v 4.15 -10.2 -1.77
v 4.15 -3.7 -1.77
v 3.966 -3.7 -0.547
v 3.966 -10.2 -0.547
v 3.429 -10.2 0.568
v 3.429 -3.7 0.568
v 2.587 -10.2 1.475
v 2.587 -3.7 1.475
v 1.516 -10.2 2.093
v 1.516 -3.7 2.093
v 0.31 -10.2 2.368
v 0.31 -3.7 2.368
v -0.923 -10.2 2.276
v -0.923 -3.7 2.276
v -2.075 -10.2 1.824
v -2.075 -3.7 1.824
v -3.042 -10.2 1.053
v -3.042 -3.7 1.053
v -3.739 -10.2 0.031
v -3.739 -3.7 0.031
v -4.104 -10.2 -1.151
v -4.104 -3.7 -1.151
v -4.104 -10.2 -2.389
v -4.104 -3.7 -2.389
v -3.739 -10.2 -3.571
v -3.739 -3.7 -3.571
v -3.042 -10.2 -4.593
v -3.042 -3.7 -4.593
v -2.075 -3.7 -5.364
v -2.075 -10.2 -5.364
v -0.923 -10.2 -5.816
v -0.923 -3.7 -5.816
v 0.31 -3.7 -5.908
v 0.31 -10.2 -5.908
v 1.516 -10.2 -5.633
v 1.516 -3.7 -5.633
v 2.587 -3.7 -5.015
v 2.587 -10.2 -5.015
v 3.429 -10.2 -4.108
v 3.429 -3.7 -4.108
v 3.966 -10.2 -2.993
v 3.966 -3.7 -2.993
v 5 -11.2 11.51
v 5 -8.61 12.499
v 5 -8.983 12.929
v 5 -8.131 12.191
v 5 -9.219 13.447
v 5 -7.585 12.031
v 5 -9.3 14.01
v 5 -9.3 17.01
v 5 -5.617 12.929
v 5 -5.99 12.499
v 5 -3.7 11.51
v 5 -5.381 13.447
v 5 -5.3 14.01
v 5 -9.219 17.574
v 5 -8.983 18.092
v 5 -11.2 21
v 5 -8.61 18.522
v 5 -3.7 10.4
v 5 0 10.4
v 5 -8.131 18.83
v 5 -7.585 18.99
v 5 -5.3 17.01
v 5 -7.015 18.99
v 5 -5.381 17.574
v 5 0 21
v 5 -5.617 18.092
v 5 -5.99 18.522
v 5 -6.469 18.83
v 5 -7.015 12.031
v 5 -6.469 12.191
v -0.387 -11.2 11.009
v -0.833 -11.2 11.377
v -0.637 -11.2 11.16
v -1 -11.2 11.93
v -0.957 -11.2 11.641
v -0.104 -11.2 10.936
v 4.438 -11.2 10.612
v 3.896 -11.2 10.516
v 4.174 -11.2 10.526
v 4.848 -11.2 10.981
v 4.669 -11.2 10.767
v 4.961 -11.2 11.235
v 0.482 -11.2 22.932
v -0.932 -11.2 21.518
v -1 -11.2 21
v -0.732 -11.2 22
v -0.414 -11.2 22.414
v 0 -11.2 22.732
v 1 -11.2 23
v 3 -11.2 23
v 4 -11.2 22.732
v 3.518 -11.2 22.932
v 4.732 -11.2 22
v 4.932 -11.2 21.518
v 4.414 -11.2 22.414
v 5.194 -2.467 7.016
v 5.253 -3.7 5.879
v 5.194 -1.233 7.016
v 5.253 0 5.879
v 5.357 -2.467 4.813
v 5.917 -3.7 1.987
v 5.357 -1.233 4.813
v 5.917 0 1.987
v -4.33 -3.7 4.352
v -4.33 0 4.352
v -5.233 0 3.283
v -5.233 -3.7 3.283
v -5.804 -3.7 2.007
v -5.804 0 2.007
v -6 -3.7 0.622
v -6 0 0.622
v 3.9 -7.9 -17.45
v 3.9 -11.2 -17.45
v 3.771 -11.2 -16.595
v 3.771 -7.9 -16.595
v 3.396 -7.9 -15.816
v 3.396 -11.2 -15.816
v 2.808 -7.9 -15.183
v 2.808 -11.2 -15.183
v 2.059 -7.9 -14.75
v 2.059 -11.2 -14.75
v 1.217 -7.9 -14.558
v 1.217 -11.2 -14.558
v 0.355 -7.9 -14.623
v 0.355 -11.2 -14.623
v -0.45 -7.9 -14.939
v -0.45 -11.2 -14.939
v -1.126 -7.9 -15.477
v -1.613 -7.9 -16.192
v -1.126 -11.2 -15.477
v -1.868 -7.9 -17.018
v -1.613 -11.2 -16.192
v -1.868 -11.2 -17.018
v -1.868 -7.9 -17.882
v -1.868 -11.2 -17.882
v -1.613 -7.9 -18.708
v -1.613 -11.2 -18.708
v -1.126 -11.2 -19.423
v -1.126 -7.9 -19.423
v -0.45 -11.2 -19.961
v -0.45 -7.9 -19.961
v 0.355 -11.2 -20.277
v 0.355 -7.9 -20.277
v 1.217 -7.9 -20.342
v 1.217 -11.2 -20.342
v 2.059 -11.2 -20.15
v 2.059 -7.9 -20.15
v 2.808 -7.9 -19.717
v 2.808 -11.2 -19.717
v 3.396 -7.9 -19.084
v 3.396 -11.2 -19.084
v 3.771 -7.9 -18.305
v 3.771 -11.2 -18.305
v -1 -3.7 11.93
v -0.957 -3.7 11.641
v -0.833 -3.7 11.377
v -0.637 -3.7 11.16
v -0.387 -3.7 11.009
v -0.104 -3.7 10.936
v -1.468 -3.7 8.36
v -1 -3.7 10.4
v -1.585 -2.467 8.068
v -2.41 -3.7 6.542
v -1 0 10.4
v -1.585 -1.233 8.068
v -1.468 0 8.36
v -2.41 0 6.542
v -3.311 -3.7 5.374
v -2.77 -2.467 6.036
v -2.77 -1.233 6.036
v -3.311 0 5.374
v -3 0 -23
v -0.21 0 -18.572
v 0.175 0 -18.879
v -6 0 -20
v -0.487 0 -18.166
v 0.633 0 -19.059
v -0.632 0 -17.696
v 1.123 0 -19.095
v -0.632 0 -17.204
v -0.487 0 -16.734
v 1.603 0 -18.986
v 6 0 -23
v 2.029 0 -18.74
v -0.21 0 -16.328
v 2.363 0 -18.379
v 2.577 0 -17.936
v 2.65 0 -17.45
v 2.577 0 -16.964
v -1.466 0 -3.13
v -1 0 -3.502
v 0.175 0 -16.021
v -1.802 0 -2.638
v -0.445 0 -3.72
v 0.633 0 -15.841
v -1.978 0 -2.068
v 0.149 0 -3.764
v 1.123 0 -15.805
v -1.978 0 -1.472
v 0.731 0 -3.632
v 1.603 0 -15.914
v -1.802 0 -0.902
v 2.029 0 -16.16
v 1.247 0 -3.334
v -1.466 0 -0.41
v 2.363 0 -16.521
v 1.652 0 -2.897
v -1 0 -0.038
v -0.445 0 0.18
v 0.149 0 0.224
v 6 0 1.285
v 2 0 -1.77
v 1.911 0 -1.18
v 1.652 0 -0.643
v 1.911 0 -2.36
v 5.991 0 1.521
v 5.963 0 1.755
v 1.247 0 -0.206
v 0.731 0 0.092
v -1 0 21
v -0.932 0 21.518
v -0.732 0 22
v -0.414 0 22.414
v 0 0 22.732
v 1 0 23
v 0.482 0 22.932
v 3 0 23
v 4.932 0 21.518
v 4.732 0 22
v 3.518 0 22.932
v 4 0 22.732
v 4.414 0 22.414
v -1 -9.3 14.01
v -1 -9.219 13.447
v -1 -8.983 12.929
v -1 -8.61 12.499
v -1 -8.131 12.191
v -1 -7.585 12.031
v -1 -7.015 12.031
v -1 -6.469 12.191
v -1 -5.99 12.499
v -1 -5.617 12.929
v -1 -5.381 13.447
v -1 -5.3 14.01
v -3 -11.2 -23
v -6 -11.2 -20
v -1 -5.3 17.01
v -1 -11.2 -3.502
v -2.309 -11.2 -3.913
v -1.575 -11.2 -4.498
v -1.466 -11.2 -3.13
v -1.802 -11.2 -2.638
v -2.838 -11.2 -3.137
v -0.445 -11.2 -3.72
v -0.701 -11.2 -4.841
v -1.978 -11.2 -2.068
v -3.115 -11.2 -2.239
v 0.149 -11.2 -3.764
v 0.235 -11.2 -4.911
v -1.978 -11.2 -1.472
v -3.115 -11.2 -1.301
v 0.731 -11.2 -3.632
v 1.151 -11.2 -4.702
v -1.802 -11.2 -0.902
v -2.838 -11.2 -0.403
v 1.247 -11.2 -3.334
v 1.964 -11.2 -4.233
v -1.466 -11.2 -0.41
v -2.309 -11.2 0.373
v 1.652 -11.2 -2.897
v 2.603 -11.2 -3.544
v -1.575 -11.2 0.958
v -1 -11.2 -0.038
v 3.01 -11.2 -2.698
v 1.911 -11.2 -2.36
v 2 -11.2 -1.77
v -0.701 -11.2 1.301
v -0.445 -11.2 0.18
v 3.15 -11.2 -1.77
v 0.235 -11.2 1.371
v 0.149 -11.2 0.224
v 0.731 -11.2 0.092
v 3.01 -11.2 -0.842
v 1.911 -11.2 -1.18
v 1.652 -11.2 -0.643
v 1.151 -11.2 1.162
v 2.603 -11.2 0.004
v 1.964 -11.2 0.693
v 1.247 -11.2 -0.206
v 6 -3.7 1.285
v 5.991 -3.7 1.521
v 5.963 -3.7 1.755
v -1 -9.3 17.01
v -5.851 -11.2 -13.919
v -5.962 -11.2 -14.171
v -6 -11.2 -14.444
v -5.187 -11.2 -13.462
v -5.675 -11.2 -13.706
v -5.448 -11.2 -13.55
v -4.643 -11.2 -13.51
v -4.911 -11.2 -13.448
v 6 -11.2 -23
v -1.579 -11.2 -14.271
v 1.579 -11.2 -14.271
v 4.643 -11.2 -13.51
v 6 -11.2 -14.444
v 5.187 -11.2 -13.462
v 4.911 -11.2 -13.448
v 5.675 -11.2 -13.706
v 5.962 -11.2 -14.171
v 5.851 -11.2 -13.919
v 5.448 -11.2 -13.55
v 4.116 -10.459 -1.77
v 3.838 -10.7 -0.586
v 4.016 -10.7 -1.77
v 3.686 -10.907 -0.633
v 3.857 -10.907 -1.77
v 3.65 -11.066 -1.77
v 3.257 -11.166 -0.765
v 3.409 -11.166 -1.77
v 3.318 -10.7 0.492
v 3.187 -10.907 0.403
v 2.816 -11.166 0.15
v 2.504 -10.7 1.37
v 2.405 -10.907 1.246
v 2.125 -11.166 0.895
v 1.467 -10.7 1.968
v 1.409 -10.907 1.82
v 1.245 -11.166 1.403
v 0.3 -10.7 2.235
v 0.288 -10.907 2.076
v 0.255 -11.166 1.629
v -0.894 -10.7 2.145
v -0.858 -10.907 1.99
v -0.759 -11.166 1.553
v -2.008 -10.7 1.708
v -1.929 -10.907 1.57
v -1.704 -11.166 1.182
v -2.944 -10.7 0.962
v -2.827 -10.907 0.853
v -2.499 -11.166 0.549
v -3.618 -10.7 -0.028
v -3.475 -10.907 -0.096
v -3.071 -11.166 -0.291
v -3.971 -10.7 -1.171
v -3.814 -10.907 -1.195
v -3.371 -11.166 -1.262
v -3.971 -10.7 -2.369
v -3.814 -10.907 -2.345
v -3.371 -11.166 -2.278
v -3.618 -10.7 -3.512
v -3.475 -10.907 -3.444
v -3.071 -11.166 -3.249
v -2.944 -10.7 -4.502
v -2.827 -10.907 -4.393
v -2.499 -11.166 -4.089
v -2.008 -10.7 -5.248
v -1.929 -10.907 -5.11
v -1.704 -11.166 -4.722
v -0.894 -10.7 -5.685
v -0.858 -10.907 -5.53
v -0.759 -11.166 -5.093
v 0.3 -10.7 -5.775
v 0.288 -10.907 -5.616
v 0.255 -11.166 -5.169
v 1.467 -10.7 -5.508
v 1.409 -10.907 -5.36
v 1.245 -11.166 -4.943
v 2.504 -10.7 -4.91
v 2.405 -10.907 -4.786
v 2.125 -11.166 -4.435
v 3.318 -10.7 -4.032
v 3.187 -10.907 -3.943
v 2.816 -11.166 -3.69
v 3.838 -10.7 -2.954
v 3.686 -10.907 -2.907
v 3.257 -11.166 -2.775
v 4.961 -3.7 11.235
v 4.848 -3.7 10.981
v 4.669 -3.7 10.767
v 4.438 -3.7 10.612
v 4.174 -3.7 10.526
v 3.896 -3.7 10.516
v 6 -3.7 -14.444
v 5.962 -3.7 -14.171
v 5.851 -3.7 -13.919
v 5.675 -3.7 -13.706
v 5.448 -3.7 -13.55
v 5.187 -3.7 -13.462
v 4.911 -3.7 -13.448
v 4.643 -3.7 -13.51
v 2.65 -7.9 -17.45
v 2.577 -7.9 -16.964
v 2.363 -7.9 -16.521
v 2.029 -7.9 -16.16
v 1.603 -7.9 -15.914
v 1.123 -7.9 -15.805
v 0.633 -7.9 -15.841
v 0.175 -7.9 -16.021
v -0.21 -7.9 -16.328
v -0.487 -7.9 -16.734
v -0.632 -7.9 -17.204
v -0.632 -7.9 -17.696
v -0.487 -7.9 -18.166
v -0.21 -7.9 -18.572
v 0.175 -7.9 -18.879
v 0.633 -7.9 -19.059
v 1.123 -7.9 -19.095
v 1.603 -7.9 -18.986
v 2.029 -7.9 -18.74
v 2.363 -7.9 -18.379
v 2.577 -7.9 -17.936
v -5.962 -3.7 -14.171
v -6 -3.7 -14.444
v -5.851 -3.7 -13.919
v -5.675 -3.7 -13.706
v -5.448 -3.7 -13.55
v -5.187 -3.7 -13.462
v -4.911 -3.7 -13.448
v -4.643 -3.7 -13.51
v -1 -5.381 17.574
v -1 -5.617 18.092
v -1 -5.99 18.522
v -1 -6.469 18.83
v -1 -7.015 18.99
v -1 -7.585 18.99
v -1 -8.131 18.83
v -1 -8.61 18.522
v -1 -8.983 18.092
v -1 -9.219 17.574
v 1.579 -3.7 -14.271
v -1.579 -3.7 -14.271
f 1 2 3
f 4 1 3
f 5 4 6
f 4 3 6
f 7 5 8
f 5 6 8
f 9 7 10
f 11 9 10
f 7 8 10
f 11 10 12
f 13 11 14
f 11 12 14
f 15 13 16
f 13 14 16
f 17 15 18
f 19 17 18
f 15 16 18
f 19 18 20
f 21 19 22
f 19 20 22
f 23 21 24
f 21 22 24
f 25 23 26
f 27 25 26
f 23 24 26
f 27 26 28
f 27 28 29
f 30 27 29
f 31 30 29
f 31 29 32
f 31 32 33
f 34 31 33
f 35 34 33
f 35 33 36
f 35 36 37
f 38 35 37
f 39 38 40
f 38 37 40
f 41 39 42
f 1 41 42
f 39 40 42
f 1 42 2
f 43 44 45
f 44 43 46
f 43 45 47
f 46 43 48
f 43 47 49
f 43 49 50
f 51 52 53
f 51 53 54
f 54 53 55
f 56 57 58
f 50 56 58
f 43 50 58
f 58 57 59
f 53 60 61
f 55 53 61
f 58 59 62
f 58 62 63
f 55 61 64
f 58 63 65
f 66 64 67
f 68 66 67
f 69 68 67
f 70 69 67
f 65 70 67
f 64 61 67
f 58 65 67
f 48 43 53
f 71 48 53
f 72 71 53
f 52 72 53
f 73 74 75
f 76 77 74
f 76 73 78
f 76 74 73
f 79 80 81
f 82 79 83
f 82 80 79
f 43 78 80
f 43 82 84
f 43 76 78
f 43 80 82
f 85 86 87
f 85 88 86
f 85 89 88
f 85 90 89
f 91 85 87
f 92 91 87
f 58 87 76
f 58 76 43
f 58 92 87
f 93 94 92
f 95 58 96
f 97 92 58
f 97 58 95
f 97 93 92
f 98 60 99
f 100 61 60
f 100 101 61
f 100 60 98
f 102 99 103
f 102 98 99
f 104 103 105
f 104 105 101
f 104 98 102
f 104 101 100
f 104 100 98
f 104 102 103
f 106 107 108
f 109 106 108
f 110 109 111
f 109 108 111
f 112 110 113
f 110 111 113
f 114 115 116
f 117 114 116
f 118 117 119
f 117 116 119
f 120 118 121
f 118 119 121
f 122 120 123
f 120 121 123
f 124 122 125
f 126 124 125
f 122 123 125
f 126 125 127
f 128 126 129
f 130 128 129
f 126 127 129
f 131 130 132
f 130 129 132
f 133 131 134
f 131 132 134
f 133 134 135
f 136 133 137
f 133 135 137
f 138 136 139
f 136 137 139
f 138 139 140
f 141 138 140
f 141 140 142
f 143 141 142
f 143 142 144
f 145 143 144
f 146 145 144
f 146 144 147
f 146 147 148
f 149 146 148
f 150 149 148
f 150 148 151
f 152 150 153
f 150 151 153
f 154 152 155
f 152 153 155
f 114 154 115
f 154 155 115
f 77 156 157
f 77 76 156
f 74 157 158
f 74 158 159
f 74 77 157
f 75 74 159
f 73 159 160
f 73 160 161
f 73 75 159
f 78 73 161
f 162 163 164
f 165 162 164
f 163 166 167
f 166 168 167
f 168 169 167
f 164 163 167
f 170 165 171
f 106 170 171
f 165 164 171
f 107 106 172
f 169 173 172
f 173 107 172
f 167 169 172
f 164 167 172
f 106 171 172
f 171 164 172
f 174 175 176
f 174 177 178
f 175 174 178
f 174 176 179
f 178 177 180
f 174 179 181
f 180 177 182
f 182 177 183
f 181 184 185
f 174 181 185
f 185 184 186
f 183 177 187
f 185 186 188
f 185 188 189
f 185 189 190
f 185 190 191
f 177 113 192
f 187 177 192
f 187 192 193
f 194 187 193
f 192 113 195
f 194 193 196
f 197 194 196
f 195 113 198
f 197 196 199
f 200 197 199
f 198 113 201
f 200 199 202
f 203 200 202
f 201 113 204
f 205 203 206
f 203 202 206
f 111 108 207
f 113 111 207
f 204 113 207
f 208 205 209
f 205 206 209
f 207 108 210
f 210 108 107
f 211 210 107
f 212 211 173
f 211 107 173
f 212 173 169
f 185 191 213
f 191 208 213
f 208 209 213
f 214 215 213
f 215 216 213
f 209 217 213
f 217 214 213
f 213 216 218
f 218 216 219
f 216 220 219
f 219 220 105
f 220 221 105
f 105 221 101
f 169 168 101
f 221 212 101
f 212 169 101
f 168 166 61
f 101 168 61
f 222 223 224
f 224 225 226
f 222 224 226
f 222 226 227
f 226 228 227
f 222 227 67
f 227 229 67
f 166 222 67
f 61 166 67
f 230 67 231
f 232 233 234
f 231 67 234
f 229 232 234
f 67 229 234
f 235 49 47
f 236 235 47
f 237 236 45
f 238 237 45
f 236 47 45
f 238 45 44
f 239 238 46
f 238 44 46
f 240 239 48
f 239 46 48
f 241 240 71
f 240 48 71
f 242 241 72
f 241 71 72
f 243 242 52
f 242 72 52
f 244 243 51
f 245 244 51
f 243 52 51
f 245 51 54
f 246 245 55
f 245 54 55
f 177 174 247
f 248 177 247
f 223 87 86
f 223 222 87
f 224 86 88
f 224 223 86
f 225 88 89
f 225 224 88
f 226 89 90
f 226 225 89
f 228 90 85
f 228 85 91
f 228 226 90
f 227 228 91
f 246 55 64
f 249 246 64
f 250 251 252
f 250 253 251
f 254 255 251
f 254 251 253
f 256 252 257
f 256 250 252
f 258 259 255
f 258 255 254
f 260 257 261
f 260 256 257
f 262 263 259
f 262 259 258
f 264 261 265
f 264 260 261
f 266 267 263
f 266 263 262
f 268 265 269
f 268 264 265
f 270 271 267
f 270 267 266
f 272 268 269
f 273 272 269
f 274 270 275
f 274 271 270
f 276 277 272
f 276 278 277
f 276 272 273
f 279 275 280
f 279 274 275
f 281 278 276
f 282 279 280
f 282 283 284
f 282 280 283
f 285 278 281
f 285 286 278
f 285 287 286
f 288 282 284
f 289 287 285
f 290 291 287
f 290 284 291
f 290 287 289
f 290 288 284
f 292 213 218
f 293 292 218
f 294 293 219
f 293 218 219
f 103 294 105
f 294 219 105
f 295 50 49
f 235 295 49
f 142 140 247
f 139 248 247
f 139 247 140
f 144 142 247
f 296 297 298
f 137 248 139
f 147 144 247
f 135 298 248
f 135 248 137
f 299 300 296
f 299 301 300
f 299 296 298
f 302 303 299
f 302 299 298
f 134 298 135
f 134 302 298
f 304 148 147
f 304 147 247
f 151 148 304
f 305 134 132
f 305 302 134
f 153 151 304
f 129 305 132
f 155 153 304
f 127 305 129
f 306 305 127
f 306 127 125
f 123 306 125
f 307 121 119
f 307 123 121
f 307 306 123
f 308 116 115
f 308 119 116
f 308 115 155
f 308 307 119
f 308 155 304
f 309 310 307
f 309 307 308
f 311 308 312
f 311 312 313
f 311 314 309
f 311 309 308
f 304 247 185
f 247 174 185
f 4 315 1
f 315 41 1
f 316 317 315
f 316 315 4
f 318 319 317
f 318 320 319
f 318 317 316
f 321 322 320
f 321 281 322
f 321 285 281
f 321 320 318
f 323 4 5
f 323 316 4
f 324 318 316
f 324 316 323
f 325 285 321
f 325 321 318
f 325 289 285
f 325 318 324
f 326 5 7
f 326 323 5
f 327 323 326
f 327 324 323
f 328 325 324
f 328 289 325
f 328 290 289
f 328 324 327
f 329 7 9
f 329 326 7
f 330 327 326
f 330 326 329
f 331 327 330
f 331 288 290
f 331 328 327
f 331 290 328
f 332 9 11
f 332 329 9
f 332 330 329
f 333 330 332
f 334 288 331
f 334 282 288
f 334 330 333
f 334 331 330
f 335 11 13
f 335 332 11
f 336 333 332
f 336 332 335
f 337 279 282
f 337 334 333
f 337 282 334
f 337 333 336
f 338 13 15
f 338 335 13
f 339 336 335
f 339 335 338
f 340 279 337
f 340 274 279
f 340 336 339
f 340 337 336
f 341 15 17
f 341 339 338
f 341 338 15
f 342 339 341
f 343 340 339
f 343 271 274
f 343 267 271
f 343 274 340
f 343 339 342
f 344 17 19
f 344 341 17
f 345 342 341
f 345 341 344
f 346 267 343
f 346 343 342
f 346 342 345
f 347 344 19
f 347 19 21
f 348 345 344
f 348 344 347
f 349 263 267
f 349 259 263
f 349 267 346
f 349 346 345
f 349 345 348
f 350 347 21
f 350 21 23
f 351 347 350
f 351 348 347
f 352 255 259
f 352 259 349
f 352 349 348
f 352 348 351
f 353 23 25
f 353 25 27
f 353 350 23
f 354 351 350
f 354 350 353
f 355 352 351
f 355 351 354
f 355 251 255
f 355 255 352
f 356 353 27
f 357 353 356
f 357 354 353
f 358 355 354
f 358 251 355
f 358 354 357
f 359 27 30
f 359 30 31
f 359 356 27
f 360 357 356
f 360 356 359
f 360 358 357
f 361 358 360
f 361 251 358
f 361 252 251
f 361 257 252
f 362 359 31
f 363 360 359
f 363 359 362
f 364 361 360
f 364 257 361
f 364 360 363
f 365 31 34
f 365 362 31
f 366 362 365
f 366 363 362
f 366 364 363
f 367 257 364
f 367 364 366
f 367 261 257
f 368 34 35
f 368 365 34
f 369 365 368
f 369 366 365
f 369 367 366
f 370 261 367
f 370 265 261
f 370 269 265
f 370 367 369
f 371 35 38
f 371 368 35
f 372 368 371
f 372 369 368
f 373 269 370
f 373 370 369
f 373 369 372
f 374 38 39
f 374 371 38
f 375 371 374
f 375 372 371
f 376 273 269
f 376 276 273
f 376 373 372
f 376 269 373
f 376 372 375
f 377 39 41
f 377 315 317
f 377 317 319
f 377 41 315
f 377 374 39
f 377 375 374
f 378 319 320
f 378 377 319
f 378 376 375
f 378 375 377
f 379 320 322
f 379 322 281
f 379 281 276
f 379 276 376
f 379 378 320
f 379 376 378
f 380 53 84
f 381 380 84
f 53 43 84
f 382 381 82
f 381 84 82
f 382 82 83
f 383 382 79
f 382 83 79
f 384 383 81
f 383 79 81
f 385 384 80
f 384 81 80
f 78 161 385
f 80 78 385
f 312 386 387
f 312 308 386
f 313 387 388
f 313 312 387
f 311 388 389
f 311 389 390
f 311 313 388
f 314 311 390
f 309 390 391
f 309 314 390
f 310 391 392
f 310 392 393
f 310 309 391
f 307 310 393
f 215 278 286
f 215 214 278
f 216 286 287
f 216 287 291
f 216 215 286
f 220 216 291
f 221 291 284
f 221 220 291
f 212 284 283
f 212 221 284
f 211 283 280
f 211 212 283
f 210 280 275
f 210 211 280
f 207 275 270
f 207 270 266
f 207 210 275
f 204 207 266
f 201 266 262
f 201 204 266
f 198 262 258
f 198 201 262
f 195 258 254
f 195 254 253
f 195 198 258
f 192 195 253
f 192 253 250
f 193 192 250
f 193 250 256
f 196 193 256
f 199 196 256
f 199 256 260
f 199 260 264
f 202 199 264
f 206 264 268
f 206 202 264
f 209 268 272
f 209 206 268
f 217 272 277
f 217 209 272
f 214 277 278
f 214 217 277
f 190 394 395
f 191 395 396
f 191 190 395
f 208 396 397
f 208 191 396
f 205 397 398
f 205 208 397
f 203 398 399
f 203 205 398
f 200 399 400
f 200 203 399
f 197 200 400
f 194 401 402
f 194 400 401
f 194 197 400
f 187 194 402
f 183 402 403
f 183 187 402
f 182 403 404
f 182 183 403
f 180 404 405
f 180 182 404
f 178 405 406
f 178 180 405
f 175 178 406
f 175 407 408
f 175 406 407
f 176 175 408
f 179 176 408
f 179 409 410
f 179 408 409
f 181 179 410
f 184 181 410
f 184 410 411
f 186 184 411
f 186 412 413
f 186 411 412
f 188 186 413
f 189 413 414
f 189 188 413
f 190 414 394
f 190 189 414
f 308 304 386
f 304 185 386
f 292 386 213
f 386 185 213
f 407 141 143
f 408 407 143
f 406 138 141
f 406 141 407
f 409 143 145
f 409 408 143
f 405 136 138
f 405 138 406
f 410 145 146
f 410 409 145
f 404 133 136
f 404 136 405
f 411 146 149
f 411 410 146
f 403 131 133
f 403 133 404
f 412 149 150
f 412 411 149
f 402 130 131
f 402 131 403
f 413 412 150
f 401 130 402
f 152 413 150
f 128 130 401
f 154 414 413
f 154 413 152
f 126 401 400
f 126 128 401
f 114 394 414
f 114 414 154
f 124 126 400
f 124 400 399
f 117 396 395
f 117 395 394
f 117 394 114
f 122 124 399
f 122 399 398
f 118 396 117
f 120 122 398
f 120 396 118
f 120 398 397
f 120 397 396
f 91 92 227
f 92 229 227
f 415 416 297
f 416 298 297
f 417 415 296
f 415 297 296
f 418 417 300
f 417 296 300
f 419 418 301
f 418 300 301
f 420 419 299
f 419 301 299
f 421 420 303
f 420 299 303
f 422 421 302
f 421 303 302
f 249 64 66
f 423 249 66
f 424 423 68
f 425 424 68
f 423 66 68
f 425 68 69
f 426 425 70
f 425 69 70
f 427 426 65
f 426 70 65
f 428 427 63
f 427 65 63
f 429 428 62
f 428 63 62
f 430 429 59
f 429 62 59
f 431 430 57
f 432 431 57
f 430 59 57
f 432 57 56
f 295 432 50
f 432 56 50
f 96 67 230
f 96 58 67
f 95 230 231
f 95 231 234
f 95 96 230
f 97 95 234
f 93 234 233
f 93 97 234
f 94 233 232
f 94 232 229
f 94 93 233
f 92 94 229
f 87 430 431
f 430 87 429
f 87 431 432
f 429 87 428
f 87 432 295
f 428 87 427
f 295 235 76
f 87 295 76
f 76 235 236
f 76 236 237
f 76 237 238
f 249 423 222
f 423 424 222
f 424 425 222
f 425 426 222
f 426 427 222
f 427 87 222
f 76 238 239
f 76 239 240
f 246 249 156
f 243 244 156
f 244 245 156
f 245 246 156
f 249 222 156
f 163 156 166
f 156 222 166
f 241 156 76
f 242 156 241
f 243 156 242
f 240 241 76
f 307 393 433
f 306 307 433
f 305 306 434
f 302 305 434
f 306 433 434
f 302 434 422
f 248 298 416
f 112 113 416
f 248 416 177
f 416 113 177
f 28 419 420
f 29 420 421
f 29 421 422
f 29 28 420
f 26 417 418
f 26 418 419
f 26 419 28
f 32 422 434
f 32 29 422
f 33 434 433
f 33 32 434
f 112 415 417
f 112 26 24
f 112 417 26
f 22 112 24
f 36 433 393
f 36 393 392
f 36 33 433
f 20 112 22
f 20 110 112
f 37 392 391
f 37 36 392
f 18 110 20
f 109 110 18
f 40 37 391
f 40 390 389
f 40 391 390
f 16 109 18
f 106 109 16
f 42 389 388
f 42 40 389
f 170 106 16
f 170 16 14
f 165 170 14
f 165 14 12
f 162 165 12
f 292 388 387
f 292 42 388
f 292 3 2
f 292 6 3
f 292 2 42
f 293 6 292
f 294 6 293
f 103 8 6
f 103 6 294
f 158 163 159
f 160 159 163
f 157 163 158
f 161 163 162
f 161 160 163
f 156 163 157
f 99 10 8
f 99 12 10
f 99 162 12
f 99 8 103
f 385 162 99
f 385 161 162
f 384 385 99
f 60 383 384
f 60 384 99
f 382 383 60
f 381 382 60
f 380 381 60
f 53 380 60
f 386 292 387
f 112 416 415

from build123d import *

# Parameters (mm, degrees)
F0_R      = 1.65
F0_R_2    = 2
F1_DEPTH  = 3.7
F2_R      = 4.15
F2_R_2    = 2
F2_R_3    = 1.65
F3_DEPTH  = 7.5
F4_R      = 2
F5_R      = 1
F6_R      = 2.9
F7_DEPTH  = 3.3
F8_R      = 1
F10_DEPTH = 11.0010001
F11_SIZE  = 3


with BuildPart() as f1:
    # F0 (on Front) → F1 (new body)
    with BuildSketch(Plane.XZ):
        with BuildLine():
            Line((5, 23), (-1, 23))
            Line((-1, 23), (-1, 10.4))
            add(Edge.make_bspline(
                [(-1, 10.4), (-1.2111639775, 7.9330686148), (-2.6557673414, 5.8471197981), (-4.3304576575, 4.3515548571)],
                knots=[0, 0, 0, 0, 6.6865737794, 6.6865737794, 6.6865737794, 6.6865737794], degree=3))
            ThreePointArc((-4.3304576575, 4.3515548571), (-5.5635670417, 2.6652064856), (-6, 0.6222048076))
            Line((-6, 0.6222048076), (-6, -23))
            Line((-6, -23), (6, -23))
            Line((6, -23), (6, 1.2846305262))
            ThreePointArc((6, 1.2846305262), (5.9790845004, 1.6382624525), (5.9166296405, 1.9869634531))
            add(Edge.make_bspline(
                [(5, 10.4), (5.3525537919, 5.8237470378), (5.0164384354, 5.7252537292), (5.9166296405, 1.9869634531)],
                knots=[0, 0, 0, 0, 8.5585174857, 8.5585174857, 8.5585174857, 8.5585174857], degree=3))
            Line((5, 10.4), (5, 23))
        make_face()
        with Locations((1, -17.45)):
            Circle(F0_R, mode=Mode.SUBTRACT)
        with Locations((0, -1.77)):
            Circle(F0_R_2, mode=Mode.SUBTRACT)
    extrude(amount=F1_DEPTH)

    # F2 (on face) → F3 (join)
    with BuildSketch(Plane.XZ.offset(3.7)):
        with Locations((0, -1.77)):
            Circle(F2_R)
        with Locations((0, -1.77)):
            Circle(F2_R_2, mode=Mode.SUBTRACT)
        with BuildLine():
            Line((-6, -12.9), (-6, -23))
            Line((-6, -23), (6, -23))
            Line((6, -23), (6, -12.9))
            ThreePointArc((6, -12.9), (0, -14.3674374053), (-6, -12.9))
        make_face()
        with Locations((1, -17.45)):
            Circle(F2_R_3, mode=Mode.SUBTRACT)
        Polygon((5, 23), (-1, 23), (-1, 11.03), (5, 10.4), (5, 10.44), align=None)
    extrude(amount=F3_DEPTH)

    # F4
    f4_edges = [f1.edges().sort_by_distance(p)[0] for p in [
        (5, -5.6, 23),
        (-1, -5.6, 23),
    ]]
    fillet(f4_edges, radius=F4_R)

    # F5
    f5_edges = [f1.edges().sort_by_distance(p)[0] for p in [
        (-1, -7.45, 11.03),
        (5, -7.45, 10.4),
        (6, -7.45, -12.9),
        (-6, -7.45, -12.9),
    ]]
    fillet(f5_edges, radius=F5_R)

    # F6 (on face) → F7 (cut)
    with BuildSketch(Plane.XZ.offset(11.2)):
        with Locations((1, -17.45)):
            Circle(F6_R)
    extrude(amount=-F7_DEPTH, mode=Mode.SUBTRACT)

    # F8
    f8_edges = [f1.edges().sort_by_distance(p)[0] for p in [
        (-4.15, -11.2, -1.77),
    ]]
    fillet(f8_edges, radius=F8_R)

    # F9 (on face) → F10 (cut, through all)
    with BuildSketch(Plane.YZ.offset(5)):
        with BuildLine():
            Line((-5.3, 14.0104973894), (-5.3, 17.0104973894))
            ThreePointArc((-5.3, 17.0104973894), (-7.3, 19.0104973894), (-9.3, 17.0104973894))
            Line((-9.3, 17.0104973894), (-9.3, 14.0104973894))
            ThreePointArc((-9.3, 14.0104973894), (-7.3, 12.0104973894), (-5.3, 14.0104973894))
        make_face()
    extrude(amount=-F10_DEPTH, mode=Mode.SUBTRACT)

    # F11
    f11_edges = [f1.edges().sort_by_distance(p)[0] for p in [
        (-6, -5.6, -23),
    ]]
    chamfer(f11_edges, length=F11_SIZE)


solid = f1.part
